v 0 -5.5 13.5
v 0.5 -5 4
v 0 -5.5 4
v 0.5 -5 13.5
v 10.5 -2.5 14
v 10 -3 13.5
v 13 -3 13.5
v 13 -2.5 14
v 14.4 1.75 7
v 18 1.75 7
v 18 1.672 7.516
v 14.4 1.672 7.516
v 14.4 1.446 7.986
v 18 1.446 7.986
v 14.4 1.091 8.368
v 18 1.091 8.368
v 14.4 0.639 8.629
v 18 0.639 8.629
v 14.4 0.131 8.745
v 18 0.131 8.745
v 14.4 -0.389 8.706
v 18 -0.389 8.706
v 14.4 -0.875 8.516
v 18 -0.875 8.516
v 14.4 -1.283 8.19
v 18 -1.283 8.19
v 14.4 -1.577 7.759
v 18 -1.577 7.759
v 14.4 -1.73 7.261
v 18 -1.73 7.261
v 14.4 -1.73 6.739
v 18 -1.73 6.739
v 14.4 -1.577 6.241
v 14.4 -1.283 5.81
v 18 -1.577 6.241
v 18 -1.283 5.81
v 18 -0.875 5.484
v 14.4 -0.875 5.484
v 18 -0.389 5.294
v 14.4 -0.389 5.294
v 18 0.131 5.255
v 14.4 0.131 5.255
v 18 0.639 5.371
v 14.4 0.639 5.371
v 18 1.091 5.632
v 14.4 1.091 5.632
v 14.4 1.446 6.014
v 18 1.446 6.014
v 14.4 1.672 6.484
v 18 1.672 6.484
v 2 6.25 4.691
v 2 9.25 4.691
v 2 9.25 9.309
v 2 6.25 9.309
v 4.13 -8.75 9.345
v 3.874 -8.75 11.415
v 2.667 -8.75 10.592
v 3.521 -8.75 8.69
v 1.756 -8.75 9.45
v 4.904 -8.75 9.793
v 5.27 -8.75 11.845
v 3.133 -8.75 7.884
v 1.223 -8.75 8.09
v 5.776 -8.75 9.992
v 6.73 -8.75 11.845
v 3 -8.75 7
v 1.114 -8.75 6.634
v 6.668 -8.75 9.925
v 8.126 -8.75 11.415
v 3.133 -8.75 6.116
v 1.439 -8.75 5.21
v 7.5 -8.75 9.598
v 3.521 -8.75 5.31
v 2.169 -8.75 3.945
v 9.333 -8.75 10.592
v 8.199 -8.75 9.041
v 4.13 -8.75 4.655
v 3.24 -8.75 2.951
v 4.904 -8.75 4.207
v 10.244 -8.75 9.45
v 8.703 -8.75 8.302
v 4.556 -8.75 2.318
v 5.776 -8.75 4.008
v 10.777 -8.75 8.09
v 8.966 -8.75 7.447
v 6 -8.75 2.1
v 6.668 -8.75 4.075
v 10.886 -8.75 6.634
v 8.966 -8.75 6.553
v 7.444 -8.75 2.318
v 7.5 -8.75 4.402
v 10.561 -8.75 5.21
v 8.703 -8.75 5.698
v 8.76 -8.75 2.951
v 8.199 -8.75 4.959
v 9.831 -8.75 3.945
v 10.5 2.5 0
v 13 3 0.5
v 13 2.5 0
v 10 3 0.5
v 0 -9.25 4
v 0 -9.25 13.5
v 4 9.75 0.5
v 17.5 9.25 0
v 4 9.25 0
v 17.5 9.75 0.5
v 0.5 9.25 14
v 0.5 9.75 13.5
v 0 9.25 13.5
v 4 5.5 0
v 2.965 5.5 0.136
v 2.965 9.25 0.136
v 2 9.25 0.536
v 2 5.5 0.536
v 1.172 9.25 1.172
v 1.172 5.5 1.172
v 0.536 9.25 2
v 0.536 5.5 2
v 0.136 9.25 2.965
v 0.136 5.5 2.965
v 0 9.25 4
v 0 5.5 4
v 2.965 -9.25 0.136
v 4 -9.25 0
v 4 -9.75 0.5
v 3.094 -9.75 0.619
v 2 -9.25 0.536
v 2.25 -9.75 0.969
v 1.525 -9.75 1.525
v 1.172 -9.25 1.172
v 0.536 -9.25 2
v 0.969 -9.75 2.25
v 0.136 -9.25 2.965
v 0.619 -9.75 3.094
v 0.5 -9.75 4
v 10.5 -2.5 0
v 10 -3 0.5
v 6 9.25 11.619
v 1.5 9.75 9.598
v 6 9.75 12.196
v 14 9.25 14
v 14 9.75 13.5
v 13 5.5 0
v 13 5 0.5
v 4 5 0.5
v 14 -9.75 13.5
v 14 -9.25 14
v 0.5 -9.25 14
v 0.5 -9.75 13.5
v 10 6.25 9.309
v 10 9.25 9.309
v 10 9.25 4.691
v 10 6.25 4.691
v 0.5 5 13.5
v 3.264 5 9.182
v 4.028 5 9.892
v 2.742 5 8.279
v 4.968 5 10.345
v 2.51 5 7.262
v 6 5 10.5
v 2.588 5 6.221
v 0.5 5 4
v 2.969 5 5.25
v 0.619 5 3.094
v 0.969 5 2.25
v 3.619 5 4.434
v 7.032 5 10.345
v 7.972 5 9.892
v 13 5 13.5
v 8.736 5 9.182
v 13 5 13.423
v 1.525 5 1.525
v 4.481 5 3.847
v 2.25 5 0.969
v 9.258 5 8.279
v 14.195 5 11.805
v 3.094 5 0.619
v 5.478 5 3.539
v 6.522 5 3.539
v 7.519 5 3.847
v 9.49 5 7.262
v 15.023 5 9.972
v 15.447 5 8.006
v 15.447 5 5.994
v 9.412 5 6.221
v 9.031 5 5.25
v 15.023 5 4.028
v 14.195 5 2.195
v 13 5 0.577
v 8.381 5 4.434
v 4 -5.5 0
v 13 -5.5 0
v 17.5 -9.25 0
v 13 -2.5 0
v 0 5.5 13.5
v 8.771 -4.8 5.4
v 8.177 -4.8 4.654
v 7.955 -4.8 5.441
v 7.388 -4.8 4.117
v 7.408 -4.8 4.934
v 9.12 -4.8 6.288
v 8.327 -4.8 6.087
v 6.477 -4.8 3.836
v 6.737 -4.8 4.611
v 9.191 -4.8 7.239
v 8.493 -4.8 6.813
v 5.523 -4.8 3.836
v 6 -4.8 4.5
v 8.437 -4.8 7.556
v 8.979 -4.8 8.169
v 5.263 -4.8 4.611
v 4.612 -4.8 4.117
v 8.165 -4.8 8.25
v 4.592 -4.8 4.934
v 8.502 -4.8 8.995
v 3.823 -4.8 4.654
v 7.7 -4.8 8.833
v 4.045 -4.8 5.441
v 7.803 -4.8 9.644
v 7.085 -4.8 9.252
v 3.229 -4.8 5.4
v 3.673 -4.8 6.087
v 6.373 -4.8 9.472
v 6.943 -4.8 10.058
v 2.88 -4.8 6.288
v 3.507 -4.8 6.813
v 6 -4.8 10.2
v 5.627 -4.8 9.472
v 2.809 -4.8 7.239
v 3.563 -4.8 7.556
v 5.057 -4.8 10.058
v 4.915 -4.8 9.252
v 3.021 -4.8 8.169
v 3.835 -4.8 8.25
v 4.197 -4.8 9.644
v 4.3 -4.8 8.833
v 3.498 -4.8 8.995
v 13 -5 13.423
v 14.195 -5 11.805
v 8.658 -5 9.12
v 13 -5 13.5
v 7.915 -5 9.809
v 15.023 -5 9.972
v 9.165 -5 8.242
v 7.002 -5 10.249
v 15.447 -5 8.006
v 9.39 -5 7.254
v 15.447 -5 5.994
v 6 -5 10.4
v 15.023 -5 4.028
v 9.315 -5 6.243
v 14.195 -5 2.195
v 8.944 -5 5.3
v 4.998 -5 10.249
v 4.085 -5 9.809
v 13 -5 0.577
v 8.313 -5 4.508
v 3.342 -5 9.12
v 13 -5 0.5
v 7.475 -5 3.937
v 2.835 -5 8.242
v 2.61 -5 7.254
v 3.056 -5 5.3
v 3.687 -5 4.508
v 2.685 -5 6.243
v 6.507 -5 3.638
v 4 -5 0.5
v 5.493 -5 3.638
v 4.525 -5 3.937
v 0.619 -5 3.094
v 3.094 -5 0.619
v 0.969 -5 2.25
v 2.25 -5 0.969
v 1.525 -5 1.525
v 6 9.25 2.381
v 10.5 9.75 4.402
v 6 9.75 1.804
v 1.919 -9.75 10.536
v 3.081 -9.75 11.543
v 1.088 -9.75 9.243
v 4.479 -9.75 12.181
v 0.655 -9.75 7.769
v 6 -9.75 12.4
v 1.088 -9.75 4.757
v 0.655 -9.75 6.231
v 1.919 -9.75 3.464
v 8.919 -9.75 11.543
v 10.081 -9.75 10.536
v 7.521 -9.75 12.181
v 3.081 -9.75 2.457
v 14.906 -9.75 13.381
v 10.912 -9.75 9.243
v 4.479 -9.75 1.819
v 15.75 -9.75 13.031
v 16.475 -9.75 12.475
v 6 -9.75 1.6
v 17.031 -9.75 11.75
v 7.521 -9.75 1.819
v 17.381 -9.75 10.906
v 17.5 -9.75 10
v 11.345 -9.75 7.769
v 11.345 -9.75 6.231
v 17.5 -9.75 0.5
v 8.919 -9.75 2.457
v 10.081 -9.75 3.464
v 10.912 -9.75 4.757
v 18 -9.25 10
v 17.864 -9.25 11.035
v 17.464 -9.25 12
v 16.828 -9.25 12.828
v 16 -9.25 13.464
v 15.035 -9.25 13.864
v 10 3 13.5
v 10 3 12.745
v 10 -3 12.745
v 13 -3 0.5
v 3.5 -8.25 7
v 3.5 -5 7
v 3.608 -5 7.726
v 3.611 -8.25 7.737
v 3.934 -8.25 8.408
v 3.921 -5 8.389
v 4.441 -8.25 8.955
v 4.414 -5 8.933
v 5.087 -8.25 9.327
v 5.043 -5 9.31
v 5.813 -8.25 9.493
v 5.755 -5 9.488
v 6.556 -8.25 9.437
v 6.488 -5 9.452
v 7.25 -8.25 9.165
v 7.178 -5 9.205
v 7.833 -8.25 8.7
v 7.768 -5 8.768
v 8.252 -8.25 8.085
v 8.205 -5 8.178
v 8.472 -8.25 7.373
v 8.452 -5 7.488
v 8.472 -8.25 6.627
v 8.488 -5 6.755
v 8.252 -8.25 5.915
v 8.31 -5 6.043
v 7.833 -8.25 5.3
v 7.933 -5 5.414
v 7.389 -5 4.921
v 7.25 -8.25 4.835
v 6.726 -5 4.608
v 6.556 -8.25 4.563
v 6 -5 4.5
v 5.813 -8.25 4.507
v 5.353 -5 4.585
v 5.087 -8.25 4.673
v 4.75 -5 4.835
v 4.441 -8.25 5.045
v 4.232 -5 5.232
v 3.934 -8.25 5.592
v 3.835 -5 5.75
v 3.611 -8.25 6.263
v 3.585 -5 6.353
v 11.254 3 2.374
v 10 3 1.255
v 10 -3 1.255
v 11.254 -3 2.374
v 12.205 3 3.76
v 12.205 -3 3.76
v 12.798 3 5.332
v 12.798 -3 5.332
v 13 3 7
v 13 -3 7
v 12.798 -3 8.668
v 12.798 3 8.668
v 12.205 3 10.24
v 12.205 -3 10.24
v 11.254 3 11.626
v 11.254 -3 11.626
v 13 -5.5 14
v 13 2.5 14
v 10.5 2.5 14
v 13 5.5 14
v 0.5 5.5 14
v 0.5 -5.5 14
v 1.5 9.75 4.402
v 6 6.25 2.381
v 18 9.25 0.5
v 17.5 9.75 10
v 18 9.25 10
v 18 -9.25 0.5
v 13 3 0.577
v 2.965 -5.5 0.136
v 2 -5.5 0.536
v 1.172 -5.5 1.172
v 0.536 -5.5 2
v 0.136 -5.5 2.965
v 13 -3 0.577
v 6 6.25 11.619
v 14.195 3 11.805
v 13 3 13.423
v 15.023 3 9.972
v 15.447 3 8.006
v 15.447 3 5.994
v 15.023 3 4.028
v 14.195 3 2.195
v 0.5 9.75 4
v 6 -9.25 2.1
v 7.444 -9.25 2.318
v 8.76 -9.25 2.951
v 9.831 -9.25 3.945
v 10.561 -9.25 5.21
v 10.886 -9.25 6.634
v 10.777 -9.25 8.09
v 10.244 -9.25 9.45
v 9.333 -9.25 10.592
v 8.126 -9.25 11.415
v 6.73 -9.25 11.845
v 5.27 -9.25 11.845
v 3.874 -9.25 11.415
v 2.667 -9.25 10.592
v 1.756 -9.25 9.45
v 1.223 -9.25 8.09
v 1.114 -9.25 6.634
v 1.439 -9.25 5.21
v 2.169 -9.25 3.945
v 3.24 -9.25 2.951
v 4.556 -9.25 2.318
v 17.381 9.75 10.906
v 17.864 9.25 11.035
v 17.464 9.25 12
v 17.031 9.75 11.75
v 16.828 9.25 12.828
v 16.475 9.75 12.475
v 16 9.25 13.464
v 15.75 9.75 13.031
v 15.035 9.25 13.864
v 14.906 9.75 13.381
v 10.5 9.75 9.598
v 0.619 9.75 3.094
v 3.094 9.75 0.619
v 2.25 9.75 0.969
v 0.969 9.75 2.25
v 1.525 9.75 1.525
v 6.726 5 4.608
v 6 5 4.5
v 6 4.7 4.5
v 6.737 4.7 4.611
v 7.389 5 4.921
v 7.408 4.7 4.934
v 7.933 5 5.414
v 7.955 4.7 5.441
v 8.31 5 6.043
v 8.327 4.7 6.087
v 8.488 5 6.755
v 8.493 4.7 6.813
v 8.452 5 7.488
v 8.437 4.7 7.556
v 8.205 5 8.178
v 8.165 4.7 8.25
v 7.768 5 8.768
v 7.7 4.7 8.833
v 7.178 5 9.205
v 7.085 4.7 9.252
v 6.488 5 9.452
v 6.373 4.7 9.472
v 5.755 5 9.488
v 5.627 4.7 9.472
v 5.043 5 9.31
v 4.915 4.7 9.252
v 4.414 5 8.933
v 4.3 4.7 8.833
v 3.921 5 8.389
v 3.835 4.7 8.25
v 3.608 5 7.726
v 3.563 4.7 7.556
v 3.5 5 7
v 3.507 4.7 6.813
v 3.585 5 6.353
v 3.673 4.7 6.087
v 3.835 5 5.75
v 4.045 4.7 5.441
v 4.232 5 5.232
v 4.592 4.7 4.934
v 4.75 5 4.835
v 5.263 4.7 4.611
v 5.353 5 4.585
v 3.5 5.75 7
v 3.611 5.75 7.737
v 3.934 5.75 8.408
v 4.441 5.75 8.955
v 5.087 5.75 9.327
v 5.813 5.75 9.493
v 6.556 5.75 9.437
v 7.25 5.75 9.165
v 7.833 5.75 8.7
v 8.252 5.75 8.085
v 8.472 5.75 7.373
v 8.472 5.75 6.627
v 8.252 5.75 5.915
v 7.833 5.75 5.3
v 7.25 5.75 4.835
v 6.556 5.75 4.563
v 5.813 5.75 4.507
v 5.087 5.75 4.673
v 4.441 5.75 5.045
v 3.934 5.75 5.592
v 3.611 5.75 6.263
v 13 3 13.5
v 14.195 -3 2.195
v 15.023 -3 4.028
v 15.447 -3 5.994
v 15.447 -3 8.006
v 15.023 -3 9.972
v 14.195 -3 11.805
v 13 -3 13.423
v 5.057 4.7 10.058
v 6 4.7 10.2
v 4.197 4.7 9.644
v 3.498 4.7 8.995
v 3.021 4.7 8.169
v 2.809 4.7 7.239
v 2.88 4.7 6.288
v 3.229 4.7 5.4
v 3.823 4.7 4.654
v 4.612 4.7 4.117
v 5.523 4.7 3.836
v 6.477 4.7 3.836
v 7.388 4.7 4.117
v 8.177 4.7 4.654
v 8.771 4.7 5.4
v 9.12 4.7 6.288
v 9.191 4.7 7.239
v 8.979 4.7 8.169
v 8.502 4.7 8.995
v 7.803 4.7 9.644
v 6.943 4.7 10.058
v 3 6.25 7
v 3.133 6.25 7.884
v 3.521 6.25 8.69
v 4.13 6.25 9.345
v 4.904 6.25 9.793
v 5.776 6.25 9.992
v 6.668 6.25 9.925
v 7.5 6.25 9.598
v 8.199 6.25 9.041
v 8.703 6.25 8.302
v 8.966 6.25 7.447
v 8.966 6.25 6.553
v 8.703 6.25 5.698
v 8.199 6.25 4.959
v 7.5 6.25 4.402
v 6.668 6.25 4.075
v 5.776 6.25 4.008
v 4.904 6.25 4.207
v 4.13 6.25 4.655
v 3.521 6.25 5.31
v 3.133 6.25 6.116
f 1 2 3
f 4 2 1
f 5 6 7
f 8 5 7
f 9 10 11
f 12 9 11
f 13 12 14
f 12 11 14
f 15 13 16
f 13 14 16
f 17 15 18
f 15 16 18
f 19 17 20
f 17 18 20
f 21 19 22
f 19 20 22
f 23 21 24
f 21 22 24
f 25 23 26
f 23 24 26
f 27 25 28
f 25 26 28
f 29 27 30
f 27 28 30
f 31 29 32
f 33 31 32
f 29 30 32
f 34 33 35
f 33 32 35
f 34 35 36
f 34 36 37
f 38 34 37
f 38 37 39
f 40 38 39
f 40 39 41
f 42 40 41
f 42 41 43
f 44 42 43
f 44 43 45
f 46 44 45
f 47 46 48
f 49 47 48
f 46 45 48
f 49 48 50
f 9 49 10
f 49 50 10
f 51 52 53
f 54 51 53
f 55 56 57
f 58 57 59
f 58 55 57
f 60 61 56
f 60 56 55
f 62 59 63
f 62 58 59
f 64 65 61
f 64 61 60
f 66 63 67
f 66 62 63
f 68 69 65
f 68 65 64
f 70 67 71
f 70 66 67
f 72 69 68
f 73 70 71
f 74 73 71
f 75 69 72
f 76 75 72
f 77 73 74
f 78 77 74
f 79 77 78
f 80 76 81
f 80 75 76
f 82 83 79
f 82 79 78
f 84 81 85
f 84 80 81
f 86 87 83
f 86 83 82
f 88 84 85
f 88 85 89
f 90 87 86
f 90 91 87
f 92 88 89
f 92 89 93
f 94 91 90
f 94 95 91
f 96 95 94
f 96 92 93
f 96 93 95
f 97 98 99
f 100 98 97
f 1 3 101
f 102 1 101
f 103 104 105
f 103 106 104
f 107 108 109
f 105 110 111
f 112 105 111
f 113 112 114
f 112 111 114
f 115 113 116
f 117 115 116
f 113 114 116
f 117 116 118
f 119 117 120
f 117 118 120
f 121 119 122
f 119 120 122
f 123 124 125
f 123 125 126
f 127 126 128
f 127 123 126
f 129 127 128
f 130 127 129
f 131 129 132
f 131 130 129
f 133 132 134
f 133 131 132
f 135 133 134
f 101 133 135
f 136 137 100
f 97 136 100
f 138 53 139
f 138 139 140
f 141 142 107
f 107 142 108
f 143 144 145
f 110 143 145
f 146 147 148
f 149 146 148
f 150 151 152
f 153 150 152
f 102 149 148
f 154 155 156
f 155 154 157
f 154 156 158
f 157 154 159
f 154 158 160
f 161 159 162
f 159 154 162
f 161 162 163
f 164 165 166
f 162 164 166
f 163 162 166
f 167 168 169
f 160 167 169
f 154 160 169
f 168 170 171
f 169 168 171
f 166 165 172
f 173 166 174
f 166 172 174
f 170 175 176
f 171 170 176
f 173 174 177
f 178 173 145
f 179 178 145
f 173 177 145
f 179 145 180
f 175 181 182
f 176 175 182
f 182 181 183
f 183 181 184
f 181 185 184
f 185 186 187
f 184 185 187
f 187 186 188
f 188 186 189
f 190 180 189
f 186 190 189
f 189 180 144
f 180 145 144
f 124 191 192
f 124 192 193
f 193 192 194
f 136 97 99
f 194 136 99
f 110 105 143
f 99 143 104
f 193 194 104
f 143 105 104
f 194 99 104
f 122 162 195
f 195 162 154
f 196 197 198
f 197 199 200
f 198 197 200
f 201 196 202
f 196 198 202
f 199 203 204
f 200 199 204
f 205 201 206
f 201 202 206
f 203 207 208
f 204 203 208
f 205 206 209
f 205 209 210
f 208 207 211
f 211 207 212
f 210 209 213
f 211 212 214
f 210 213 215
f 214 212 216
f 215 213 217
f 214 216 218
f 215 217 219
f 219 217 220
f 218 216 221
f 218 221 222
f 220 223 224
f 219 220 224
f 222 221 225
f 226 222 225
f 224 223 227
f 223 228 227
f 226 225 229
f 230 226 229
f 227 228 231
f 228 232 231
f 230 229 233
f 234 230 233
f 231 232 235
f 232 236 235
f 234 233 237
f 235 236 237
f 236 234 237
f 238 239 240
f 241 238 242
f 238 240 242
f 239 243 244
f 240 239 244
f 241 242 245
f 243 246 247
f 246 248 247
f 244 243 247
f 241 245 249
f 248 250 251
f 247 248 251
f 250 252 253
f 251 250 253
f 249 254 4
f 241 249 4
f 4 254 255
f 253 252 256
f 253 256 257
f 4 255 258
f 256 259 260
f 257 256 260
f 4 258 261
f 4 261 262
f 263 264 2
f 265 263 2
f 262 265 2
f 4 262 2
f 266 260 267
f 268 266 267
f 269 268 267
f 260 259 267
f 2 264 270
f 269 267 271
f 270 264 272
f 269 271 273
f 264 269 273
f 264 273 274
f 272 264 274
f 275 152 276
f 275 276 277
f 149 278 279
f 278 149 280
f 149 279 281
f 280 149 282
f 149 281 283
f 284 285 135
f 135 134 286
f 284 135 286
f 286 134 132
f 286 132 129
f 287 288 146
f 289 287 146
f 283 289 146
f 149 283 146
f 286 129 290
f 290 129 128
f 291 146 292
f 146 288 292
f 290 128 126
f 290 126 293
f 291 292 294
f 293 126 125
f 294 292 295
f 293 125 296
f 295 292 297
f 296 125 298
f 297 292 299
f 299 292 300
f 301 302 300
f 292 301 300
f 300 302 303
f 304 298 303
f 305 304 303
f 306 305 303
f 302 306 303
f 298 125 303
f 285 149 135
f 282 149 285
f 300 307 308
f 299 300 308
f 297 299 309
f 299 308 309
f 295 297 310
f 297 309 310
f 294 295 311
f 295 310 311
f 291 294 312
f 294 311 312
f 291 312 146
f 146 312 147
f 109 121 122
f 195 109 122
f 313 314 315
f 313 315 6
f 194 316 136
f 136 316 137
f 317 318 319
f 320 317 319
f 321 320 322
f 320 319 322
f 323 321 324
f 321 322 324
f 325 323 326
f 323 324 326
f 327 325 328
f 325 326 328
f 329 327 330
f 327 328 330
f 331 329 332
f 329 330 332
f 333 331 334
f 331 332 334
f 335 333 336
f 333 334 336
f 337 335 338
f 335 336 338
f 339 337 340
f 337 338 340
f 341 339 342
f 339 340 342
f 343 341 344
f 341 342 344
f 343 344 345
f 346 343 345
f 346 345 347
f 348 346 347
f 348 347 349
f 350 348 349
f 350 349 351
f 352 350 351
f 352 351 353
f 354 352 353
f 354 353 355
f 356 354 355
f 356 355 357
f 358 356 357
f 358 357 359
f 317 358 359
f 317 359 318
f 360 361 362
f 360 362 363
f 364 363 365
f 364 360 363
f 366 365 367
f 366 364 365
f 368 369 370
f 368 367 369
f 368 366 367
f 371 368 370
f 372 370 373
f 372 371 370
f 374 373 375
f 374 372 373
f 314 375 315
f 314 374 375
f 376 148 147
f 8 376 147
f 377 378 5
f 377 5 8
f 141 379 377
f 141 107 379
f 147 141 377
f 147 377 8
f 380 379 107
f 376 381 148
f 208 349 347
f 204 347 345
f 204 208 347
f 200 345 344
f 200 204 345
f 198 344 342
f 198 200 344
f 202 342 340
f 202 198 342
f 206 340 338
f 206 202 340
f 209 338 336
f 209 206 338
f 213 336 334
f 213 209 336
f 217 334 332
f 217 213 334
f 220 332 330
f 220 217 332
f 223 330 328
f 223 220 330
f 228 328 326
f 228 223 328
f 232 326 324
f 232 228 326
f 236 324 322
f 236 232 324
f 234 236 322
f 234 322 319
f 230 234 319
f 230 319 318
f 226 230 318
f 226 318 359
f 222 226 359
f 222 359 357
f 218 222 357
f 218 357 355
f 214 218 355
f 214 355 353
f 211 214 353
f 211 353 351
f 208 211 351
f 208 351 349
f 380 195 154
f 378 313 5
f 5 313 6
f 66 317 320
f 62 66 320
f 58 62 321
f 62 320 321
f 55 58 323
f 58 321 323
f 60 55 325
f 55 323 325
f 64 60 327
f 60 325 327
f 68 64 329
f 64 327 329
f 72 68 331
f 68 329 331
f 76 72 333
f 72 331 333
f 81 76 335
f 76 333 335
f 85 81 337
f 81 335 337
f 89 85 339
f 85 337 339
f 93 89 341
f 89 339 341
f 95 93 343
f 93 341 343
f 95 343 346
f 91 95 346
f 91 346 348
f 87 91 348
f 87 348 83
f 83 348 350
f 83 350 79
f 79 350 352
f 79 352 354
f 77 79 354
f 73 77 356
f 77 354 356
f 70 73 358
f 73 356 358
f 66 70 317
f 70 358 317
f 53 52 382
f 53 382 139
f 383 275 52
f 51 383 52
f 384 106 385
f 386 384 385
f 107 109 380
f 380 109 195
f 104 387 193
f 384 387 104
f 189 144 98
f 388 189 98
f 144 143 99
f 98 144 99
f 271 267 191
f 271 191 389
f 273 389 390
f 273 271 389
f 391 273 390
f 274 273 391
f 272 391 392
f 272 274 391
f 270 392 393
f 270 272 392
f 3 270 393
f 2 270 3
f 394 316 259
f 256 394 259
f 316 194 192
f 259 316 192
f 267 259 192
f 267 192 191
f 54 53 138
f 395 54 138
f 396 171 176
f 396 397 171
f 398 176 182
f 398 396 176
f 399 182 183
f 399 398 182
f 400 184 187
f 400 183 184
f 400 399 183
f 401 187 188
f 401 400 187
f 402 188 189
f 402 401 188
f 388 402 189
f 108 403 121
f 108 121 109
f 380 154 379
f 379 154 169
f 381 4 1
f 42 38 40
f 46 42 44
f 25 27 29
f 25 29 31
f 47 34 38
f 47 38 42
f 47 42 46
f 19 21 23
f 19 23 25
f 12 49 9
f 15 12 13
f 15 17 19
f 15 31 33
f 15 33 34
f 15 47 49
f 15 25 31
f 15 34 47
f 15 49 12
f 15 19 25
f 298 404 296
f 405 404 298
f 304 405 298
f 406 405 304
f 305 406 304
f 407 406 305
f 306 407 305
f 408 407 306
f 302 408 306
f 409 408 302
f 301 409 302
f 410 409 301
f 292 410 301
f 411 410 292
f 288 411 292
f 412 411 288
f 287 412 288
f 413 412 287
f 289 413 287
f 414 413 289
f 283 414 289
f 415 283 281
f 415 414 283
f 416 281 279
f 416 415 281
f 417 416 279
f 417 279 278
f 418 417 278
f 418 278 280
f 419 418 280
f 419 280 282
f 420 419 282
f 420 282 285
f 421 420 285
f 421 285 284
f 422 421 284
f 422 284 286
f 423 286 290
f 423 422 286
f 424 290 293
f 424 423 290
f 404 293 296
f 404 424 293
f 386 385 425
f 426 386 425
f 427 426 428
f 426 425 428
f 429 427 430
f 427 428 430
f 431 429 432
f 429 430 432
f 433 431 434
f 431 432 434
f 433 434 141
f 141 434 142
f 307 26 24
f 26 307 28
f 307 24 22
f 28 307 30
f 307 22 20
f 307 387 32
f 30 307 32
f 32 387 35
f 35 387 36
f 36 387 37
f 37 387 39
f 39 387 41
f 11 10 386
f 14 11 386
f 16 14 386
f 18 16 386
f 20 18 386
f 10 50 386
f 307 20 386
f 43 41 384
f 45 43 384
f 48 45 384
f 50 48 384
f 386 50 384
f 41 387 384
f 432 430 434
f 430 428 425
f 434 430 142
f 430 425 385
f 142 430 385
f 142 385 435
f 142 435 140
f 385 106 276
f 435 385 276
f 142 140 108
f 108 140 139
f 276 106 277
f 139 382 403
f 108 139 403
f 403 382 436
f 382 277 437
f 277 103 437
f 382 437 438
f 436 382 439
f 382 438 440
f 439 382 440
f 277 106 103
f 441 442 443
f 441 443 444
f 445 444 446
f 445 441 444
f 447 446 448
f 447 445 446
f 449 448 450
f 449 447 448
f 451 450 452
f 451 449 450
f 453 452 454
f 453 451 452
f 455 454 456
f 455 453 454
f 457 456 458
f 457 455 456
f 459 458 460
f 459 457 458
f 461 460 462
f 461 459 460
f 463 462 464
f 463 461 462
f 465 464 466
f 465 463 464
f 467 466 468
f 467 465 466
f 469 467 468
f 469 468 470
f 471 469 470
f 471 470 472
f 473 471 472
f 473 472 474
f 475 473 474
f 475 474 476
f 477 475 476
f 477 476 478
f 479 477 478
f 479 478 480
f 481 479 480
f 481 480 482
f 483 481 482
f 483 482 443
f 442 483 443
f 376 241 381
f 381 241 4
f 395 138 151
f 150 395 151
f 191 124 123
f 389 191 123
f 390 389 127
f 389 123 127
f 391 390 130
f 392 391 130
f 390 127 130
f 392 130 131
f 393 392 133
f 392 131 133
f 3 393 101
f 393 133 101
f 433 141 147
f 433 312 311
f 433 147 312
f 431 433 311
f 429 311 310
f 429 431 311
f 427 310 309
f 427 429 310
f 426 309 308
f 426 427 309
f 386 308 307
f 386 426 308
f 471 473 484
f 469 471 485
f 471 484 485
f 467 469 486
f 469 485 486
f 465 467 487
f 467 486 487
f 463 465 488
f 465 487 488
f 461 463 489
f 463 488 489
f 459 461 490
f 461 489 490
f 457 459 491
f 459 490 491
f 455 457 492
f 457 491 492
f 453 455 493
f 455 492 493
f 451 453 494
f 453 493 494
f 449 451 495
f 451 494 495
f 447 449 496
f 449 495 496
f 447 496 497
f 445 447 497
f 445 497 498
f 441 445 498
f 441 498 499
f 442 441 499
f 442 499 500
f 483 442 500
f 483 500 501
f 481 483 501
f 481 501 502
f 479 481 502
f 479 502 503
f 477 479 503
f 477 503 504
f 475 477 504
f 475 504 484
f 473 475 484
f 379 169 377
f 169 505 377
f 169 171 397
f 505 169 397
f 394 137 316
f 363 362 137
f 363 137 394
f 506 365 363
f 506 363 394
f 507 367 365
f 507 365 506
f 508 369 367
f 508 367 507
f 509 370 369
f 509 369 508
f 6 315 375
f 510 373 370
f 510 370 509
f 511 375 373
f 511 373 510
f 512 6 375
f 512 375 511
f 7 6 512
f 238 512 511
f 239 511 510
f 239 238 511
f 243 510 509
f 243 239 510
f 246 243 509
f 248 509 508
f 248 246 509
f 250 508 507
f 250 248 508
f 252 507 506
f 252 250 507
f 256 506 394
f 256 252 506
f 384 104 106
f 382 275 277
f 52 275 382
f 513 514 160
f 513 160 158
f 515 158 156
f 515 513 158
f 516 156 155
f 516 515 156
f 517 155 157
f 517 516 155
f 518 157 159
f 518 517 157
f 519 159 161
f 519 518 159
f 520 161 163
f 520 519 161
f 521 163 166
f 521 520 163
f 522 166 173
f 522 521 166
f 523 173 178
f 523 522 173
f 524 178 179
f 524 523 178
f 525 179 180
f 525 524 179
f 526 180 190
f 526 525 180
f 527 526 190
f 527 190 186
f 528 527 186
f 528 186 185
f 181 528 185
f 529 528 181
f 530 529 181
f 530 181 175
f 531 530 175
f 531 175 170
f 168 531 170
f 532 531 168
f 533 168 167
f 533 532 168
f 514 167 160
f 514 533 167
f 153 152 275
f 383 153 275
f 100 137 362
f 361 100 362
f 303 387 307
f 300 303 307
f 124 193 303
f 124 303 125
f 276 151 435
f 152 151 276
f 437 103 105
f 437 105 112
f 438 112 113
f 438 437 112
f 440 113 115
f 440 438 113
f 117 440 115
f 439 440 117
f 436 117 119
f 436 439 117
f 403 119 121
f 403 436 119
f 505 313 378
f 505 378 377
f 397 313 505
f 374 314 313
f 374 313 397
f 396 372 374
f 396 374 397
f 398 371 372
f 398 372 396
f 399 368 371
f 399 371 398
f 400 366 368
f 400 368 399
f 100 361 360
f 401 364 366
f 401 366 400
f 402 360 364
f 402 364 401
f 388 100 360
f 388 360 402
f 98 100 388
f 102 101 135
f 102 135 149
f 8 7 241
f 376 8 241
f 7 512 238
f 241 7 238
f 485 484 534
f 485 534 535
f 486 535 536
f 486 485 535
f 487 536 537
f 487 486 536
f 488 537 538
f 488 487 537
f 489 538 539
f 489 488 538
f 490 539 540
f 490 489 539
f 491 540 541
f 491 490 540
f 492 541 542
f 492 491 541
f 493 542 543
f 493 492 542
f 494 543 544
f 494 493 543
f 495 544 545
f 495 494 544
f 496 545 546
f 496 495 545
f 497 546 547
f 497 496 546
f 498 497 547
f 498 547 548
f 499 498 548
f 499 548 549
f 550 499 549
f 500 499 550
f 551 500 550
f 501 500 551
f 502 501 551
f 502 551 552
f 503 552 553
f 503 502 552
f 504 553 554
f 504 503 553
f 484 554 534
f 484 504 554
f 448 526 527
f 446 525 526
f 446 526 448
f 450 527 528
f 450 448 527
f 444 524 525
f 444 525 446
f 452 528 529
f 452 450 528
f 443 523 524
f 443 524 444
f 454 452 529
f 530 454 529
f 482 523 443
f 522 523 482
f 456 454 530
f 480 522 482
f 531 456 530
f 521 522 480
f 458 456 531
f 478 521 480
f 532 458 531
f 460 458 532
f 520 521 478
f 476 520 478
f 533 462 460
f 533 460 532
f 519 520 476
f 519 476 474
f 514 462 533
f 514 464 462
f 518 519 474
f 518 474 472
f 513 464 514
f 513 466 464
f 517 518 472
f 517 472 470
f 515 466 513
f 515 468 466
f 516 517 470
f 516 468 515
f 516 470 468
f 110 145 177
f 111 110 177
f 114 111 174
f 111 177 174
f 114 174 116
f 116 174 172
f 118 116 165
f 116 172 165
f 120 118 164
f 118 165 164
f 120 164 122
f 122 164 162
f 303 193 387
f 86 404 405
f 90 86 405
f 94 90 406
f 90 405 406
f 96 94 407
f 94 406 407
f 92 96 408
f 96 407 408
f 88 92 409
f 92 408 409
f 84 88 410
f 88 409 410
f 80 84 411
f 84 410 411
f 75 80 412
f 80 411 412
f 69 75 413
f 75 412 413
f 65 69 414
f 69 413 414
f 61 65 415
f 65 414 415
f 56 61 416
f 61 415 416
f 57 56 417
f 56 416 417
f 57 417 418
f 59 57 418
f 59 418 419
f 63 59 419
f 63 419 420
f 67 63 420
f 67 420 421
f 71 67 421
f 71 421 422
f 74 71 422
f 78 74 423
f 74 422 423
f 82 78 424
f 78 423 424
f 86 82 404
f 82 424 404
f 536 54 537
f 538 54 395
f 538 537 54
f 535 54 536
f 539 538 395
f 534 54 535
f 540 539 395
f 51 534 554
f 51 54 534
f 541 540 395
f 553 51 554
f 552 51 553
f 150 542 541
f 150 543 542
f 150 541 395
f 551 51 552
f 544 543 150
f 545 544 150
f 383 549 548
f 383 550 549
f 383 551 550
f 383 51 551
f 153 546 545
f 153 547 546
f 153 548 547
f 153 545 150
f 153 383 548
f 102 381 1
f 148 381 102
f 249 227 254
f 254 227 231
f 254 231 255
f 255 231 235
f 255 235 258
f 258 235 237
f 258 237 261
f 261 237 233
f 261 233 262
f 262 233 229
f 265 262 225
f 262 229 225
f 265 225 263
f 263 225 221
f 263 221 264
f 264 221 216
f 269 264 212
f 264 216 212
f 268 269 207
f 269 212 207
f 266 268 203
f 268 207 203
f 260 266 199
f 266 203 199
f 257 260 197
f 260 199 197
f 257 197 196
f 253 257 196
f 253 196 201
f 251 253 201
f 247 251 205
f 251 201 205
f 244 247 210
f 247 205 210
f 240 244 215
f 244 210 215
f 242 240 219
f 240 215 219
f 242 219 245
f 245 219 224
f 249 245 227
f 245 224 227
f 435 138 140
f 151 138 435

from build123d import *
from build123d.topology import SkipClean

# Parameters (mm, degrees)
BOSS_EXTRUDE1_DEPTH             = 14
SKETCH2_R                       = 2.5
CUT_EXTRUDE1_DEPTH              = 31.004166377
SKETCH3_R                       = 9.5
CUT_EXTRUDE2_DEPTH              = 2
CUT_EXTRUDE3_START              = 8
SKETCH3_2_R                     = 9.5
CUT_EXTRUDE3_DEPTH              = 2
BOSS_EXTRUDE2_REACH             = 26.8
BOSS_EXTRUDE2_DIRECTION_2_REACH = 26.8
SKETCH5_R                       = 1.75
CUT_EXTRUDE4_DEPTH              = 3.6
CUT_EXTRUDE5_DEPTH              = 3.5
SKETCH7_R                       = 4.9
CUT_EXTRUDE6_DEPTH              = 1
SKETCH9_R                       = 3.5
SKETCH9_R_2                     = 2.5
BOSS_EXTRUDE3_DEPTH             = 0.3
BOSS_EXTRUDE5_START             = 9.8
SKETCH9_2_R                     = 3.5
SKETCH9_2_R_2                   = 2.5
BOSS_EXTRUDE5_DEPTH             = 0.2
FILLET1_R                       = 4
CHAMFER1_SIZE                   = 0.5
CHAMFER2_SIZE                   = 0.3
CHAMFER3_SIZE                   = 0.5


with BuildPart() as part:
    # Sketch1 → Boss-Extrude1 (new body)
    with BuildSketch(Plane.XY):
        Polygon((0, -9.75), (18, -9.75), (18, 9.75), (0, 9.75), (0, 5), (13, 5), (13, -5), (0, -5), align=None)
    extrude(amount=BOSS_EXTRUDE1_DEPTH)

    # Sketch2 → Cut-Extrude1 (cut, through all)
    with BuildSketch(Plane(origin=(0, 9.75, 0), x_dir=(1, 0, 0), z_dir=(0, 1, 0))):
        with Locations(Location((6, -7, 0), (0, 0, 180))):
            Circle(SKETCH2_R)
    extrude(amount=-CUT_EXTRUDE1_DEPTH, mode=Mode.SUBTRACT)

    # Sketch3 → Cut-Extrude2 (cut)
    with BuildSketch(Plane(origin=(0, -5, 0), x_dir=(1, 0, 0), z_dir=(0, 1, 0))):
        with Locations((6, -7)):
            Circle(SKETCH3_R)
    extrude(amount=CUT_EXTRUDE2_DEPTH, mode=Mode.SUBTRACT)

    # Sketch3<2> → Cut-Extrude3 (cut)
    with BuildSketch(Plane(origin=(0, -5, 0), x_dir=(1, 0, 0), z_dir=(0, 1, 0)).offset(CUT_EXTRUDE3_START)):
        with Locations((6, -7)):
            Circle(SKETCH3_2_R)
    extrude(amount=CUT_EXTRUDE3_DEPTH, mode=Mode.SUBTRACT)

    # Boss-Extrude2: up to this face of the body (flat: up to its plane)
    boss_extrude2_end = Plane(part.part.faces().sort_by_distance((14.012212464, 3, 7))[0])
    # Sketch4 → Boss-Extrude2 (add, up to the picked face)
    with BuildSketch(Plane(origin=(0, 0, 0), x_dir=(1, 0, 0), z_dir=(0, 1, 0)), mode=Mode.PRIVATE) as boss_extrude2_sk1:
        with BuildLine():
            Line((10, -14), (13.722333535, -14))
            Line((13.722333535, -14), (13.722333535, 0))
            Line((13.722333535, 0), (10, 0))
            Line((10, 0), (10, -1.255437353))
            ThreePointArc((10, -1.255437353), (13, -7), (10, -12.744562647))
            Line((10, -12.744562647), (10, -14))
        make_face()
    boss_extrude2_tool1 = split(extrude(boss_extrude2_sk1.sketch, amount=BOSS_EXTRUDE2_REACH, mode=Mode.PRIVATE), bisect_by=boss_extrude2_end, keep=Keep.BOTH, mode=Mode.PRIVATE)
    add(boss_extrude2_tool1.solids().sort_by(Axis((10.144864, 0, 13.372281), (0, 1, 0)))[0])

    # Boss-Extrude2 direction 2: up to this face of the body (flat: up to its plane)
    boss_extrude2_direction_2_end = Plane(part.part.faces().sort_by_distance((14.012212464, -3, 7))[0])
    # Sketch4 → Boss-Extrude2 direction 2 (add, up to the picked face)
    with BuildSketch(Plane(origin=(0, 0, 0), x_dir=(1, 0, 0), z_dir=(0, 1, 0)), mode=Mode.PRIVATE) as boss_extrude2_direction_2_sk1:
        with BuildLine():
            Line((10, -14), (13.722333535, -14))
            Line((13.722333535, -14), (13.722333535, 0))
            Line((13.722333535, 0), (10, 0))
            Line((10, 0), (10, -1.255437353))
            ThreePointArc((10, -1.255437353), (13, -7), (10, -12.744562647))
            Line((10, -12.744562647), (10, -14))
        make_face()
    boss_extrude2_direction_2_tool1 = split(extrude(boss_extrude2_direction_2_sk1.sketch, amount=-BOSS_EXTRUDE2_DIRECTION_2_REACH, mode=Mode.PRIVATE), bisect_by=boss_extrude2_direction_2_end, keep=Keep.BOTH, mode=Mode.PRIVATE)
    add(boss_extrude2_direction_2_tool1.solids().sort_by(Axis((10.144864, 0, 13.372281), (0, -1, 0)))[0])

    # Sketch5 → Cut-Extrude4 (cut)
    with BuildSketch(Plane(origin=(18, 0, 0), x_dir=(0, 0, -1), z_dir=(1, 0, 0))):
        with Locations(Location((-7, 0, 0), (0, 0, 90))):
            Circle(SKETCH5_R)
    extrude(amount=-CUT_EXTRUDE4_DEPTH, mode=Mode.SUBTRACT)

    # Sketch6 → Cut-Extrude5 (cut)
    with BuildSketch(Plane(origin=(0, 9.75, 0), x_dir=(1, 0, 0), z_dir=(0, 1, 0))):
        Polygon((6, -2.381197846), (2, -4.690598923), (2, -9.309401077), (6, -11.618802154), (10, -9.309401077), (10, -4.690598923), align=None)
    extrude(amount=-CUT_EXTRUDE5_DEPTH, mode=Mode.SUBTRACT)

    # Sketch7 → Cut-Extrude6 (cut)
    with BuildSketch(Plane.XZ.offset(9.75)):
        with Locations(Location((6, 7, 0), (0, 0, 270))):
            Circle(SKETCH7_R)
    extrude(amount=-CUT_EXTRUDE6_DEPTH, mode=Mode.SUBTRACT)

    # Sketch9 → Boss-Extrude3 (add)
    with SkipClean():  # the faces are left unmerged after this step: merging them gives an invalid solid
        with BuildSketch(Plane.XZ.offset(-5)):
            with Locations(Location((6, 7, 0), (0, 0, 90))):
                Circle(SKETCH9_R)
            with Locations(Location((6, 7, 0), (0, 0, 270))):
                Circle(SKETCH9_R_2, mode=Mode.SUBTRACT)
        extrude(amount=BOSS_EXTRUDE3_DEPTH)

    # Sketch9<2> → Boss-Extrude5 (add)
    with SkipClean():  # the faces are left unmerged after this step: merging them gives an invalid solid
        with BuildSketch(Plane.XZ.offset(-5).offset(BOSS_EXTRUDE5_START)):
            with Locations(Location((6, 7, 0), (0, 0, 90))):
                Circle(SKETCH9_2_R)
            with Locations(Location((6, 7, 0), (0, 0, 270))):
                Circle(SKETCH9_2_R_2, mode=Mode.SUBTRACT)
        extrude(amount=BOSS_EXTRUDE5_DEPTH)

    # Fillet1
    fillet1_edges = [part.edges().sort_by_distance(p)[0] for p in [
        (0, -7.375, 0),
        (18, 0, 14),
        (0, 7.375, 0),
    ]]
    fillet(fillet1_edges, radius=FILLET1_R)

    # Chamfer1
    chamfer1_edges = [part.edges().sort_by_distance(p)[0] for p in [
        (8, 9.75, 3.535898385),
        (4, 9.75, 3.535898385),
        (2, 9.75, 7),
        (4, 9.75, 10.464101615),
        (8, 9.75, 10.464101615),
        (10, 9.75, 7),
        (6, -9.75, 11.9),
    ]]
    chamfer(chamfer1_edges, length=CHAMFER1_SIZE)

    # Chamfer2
    # the kernel refuses this chamfer: 0.3 mm, written as the material it takes off along each edge
    with BuildSketch(Plane(origin=(6, 4.7, 7), x_dir=(0, 0, 1), z_dir=(1, 0, 0))) as chamfer2_piece_1_section:
        Polygon((3.5, -CHAMFER2_SIZE), (3.5 - CHAMFER2_SIZE, 0), (3.5, 0), align=None)
    chamfer2_piece_1 = revolve(axis=Axis((6, 4.7, 7), (0, -1, 0)), mode=Mode.PRIVATE)
    chamfer2_piece_1 = split(chamfer2_piece_1, bisect_by=Plane(origin=(6, 5, 3.647041133), z_dir=(0, -1, 0)), keep=Keep.TOP, mode=Mode.PRIVATE)
    add(chamfer2_piece_1, mode=Mode.SUBTRACT)
    with BuildSketch(Plane(origin=(6, -4.8, 7), x_dir=(0, 0, 1), z_dir=(1, 0, 0))) as chamfer2_piece_2_section:
        Polygon((3.5, CHAMFER2_SIZE), (3.5 - CHAMFER2_SIZE, 0), (3.5, 0), align=None)
    chamfer2_piece_2 = revolve(axis=Axis((6, -4.8, 7), (0, -1, 0)), mode=Mode.PRIVATE)
    chamfer2_piece_2 = split(chamfer2_piece_2, bisect_by=Plane(origin=(6, -5, 3.697354153), z_dir=(0, 1, 0)), keep=Keep.TOP, mode=Mode.PRIVATE)
    add(chamfer2_piece_2, mode=Mode.SUBTRACT)

    # Chamfer3
    chamfer3_edges = [part.edges().sort_by_distance(p)[0] for p in [
        (11, 9.75, 0),
        (18, 0, 0),
        (8.5, 6.25, 7),
        (8.5, -8.75, 7),
        (0, -5, 9),
        (0, 5, 9),
        (0, 9.75, 9),
        (0, -9.75, 9),
        (11, -9.75, 0),
        (18, -9.75, 5),
        (16.828427125, -9.75, 12.828427125),
        (1.171572875, -9.75, 1.171572875),
        (8.5, 5, 0),
        (1.171572875, -5, 1.171572875),
        (1.171572875, 5, 1.171572875),
        (7, 9.75, 14),
        (18, 9.75, 5),
        (16.828427125, 9.75, 12.828427125),
        (1.171572875, 9.75, 1.171572875),
        (0, 7.375, 14),
        (6.5, 5, 14),
        (6.5, -5, 14),
        (0, -7.375, 14),
        (10, 0, 14),
        (11.5, -3, 14),
        (11.5, 3, 0),
        (11.5, 3, 14),
        (10, 0, 0),
        (11.5, -3, 0),
        (8.5, -5, 0),
        (7, -9.75, 14),
    ]]
    chamfer(chamfer3_edges, length=CHAMFER3_SIZE)


solid = part.part
